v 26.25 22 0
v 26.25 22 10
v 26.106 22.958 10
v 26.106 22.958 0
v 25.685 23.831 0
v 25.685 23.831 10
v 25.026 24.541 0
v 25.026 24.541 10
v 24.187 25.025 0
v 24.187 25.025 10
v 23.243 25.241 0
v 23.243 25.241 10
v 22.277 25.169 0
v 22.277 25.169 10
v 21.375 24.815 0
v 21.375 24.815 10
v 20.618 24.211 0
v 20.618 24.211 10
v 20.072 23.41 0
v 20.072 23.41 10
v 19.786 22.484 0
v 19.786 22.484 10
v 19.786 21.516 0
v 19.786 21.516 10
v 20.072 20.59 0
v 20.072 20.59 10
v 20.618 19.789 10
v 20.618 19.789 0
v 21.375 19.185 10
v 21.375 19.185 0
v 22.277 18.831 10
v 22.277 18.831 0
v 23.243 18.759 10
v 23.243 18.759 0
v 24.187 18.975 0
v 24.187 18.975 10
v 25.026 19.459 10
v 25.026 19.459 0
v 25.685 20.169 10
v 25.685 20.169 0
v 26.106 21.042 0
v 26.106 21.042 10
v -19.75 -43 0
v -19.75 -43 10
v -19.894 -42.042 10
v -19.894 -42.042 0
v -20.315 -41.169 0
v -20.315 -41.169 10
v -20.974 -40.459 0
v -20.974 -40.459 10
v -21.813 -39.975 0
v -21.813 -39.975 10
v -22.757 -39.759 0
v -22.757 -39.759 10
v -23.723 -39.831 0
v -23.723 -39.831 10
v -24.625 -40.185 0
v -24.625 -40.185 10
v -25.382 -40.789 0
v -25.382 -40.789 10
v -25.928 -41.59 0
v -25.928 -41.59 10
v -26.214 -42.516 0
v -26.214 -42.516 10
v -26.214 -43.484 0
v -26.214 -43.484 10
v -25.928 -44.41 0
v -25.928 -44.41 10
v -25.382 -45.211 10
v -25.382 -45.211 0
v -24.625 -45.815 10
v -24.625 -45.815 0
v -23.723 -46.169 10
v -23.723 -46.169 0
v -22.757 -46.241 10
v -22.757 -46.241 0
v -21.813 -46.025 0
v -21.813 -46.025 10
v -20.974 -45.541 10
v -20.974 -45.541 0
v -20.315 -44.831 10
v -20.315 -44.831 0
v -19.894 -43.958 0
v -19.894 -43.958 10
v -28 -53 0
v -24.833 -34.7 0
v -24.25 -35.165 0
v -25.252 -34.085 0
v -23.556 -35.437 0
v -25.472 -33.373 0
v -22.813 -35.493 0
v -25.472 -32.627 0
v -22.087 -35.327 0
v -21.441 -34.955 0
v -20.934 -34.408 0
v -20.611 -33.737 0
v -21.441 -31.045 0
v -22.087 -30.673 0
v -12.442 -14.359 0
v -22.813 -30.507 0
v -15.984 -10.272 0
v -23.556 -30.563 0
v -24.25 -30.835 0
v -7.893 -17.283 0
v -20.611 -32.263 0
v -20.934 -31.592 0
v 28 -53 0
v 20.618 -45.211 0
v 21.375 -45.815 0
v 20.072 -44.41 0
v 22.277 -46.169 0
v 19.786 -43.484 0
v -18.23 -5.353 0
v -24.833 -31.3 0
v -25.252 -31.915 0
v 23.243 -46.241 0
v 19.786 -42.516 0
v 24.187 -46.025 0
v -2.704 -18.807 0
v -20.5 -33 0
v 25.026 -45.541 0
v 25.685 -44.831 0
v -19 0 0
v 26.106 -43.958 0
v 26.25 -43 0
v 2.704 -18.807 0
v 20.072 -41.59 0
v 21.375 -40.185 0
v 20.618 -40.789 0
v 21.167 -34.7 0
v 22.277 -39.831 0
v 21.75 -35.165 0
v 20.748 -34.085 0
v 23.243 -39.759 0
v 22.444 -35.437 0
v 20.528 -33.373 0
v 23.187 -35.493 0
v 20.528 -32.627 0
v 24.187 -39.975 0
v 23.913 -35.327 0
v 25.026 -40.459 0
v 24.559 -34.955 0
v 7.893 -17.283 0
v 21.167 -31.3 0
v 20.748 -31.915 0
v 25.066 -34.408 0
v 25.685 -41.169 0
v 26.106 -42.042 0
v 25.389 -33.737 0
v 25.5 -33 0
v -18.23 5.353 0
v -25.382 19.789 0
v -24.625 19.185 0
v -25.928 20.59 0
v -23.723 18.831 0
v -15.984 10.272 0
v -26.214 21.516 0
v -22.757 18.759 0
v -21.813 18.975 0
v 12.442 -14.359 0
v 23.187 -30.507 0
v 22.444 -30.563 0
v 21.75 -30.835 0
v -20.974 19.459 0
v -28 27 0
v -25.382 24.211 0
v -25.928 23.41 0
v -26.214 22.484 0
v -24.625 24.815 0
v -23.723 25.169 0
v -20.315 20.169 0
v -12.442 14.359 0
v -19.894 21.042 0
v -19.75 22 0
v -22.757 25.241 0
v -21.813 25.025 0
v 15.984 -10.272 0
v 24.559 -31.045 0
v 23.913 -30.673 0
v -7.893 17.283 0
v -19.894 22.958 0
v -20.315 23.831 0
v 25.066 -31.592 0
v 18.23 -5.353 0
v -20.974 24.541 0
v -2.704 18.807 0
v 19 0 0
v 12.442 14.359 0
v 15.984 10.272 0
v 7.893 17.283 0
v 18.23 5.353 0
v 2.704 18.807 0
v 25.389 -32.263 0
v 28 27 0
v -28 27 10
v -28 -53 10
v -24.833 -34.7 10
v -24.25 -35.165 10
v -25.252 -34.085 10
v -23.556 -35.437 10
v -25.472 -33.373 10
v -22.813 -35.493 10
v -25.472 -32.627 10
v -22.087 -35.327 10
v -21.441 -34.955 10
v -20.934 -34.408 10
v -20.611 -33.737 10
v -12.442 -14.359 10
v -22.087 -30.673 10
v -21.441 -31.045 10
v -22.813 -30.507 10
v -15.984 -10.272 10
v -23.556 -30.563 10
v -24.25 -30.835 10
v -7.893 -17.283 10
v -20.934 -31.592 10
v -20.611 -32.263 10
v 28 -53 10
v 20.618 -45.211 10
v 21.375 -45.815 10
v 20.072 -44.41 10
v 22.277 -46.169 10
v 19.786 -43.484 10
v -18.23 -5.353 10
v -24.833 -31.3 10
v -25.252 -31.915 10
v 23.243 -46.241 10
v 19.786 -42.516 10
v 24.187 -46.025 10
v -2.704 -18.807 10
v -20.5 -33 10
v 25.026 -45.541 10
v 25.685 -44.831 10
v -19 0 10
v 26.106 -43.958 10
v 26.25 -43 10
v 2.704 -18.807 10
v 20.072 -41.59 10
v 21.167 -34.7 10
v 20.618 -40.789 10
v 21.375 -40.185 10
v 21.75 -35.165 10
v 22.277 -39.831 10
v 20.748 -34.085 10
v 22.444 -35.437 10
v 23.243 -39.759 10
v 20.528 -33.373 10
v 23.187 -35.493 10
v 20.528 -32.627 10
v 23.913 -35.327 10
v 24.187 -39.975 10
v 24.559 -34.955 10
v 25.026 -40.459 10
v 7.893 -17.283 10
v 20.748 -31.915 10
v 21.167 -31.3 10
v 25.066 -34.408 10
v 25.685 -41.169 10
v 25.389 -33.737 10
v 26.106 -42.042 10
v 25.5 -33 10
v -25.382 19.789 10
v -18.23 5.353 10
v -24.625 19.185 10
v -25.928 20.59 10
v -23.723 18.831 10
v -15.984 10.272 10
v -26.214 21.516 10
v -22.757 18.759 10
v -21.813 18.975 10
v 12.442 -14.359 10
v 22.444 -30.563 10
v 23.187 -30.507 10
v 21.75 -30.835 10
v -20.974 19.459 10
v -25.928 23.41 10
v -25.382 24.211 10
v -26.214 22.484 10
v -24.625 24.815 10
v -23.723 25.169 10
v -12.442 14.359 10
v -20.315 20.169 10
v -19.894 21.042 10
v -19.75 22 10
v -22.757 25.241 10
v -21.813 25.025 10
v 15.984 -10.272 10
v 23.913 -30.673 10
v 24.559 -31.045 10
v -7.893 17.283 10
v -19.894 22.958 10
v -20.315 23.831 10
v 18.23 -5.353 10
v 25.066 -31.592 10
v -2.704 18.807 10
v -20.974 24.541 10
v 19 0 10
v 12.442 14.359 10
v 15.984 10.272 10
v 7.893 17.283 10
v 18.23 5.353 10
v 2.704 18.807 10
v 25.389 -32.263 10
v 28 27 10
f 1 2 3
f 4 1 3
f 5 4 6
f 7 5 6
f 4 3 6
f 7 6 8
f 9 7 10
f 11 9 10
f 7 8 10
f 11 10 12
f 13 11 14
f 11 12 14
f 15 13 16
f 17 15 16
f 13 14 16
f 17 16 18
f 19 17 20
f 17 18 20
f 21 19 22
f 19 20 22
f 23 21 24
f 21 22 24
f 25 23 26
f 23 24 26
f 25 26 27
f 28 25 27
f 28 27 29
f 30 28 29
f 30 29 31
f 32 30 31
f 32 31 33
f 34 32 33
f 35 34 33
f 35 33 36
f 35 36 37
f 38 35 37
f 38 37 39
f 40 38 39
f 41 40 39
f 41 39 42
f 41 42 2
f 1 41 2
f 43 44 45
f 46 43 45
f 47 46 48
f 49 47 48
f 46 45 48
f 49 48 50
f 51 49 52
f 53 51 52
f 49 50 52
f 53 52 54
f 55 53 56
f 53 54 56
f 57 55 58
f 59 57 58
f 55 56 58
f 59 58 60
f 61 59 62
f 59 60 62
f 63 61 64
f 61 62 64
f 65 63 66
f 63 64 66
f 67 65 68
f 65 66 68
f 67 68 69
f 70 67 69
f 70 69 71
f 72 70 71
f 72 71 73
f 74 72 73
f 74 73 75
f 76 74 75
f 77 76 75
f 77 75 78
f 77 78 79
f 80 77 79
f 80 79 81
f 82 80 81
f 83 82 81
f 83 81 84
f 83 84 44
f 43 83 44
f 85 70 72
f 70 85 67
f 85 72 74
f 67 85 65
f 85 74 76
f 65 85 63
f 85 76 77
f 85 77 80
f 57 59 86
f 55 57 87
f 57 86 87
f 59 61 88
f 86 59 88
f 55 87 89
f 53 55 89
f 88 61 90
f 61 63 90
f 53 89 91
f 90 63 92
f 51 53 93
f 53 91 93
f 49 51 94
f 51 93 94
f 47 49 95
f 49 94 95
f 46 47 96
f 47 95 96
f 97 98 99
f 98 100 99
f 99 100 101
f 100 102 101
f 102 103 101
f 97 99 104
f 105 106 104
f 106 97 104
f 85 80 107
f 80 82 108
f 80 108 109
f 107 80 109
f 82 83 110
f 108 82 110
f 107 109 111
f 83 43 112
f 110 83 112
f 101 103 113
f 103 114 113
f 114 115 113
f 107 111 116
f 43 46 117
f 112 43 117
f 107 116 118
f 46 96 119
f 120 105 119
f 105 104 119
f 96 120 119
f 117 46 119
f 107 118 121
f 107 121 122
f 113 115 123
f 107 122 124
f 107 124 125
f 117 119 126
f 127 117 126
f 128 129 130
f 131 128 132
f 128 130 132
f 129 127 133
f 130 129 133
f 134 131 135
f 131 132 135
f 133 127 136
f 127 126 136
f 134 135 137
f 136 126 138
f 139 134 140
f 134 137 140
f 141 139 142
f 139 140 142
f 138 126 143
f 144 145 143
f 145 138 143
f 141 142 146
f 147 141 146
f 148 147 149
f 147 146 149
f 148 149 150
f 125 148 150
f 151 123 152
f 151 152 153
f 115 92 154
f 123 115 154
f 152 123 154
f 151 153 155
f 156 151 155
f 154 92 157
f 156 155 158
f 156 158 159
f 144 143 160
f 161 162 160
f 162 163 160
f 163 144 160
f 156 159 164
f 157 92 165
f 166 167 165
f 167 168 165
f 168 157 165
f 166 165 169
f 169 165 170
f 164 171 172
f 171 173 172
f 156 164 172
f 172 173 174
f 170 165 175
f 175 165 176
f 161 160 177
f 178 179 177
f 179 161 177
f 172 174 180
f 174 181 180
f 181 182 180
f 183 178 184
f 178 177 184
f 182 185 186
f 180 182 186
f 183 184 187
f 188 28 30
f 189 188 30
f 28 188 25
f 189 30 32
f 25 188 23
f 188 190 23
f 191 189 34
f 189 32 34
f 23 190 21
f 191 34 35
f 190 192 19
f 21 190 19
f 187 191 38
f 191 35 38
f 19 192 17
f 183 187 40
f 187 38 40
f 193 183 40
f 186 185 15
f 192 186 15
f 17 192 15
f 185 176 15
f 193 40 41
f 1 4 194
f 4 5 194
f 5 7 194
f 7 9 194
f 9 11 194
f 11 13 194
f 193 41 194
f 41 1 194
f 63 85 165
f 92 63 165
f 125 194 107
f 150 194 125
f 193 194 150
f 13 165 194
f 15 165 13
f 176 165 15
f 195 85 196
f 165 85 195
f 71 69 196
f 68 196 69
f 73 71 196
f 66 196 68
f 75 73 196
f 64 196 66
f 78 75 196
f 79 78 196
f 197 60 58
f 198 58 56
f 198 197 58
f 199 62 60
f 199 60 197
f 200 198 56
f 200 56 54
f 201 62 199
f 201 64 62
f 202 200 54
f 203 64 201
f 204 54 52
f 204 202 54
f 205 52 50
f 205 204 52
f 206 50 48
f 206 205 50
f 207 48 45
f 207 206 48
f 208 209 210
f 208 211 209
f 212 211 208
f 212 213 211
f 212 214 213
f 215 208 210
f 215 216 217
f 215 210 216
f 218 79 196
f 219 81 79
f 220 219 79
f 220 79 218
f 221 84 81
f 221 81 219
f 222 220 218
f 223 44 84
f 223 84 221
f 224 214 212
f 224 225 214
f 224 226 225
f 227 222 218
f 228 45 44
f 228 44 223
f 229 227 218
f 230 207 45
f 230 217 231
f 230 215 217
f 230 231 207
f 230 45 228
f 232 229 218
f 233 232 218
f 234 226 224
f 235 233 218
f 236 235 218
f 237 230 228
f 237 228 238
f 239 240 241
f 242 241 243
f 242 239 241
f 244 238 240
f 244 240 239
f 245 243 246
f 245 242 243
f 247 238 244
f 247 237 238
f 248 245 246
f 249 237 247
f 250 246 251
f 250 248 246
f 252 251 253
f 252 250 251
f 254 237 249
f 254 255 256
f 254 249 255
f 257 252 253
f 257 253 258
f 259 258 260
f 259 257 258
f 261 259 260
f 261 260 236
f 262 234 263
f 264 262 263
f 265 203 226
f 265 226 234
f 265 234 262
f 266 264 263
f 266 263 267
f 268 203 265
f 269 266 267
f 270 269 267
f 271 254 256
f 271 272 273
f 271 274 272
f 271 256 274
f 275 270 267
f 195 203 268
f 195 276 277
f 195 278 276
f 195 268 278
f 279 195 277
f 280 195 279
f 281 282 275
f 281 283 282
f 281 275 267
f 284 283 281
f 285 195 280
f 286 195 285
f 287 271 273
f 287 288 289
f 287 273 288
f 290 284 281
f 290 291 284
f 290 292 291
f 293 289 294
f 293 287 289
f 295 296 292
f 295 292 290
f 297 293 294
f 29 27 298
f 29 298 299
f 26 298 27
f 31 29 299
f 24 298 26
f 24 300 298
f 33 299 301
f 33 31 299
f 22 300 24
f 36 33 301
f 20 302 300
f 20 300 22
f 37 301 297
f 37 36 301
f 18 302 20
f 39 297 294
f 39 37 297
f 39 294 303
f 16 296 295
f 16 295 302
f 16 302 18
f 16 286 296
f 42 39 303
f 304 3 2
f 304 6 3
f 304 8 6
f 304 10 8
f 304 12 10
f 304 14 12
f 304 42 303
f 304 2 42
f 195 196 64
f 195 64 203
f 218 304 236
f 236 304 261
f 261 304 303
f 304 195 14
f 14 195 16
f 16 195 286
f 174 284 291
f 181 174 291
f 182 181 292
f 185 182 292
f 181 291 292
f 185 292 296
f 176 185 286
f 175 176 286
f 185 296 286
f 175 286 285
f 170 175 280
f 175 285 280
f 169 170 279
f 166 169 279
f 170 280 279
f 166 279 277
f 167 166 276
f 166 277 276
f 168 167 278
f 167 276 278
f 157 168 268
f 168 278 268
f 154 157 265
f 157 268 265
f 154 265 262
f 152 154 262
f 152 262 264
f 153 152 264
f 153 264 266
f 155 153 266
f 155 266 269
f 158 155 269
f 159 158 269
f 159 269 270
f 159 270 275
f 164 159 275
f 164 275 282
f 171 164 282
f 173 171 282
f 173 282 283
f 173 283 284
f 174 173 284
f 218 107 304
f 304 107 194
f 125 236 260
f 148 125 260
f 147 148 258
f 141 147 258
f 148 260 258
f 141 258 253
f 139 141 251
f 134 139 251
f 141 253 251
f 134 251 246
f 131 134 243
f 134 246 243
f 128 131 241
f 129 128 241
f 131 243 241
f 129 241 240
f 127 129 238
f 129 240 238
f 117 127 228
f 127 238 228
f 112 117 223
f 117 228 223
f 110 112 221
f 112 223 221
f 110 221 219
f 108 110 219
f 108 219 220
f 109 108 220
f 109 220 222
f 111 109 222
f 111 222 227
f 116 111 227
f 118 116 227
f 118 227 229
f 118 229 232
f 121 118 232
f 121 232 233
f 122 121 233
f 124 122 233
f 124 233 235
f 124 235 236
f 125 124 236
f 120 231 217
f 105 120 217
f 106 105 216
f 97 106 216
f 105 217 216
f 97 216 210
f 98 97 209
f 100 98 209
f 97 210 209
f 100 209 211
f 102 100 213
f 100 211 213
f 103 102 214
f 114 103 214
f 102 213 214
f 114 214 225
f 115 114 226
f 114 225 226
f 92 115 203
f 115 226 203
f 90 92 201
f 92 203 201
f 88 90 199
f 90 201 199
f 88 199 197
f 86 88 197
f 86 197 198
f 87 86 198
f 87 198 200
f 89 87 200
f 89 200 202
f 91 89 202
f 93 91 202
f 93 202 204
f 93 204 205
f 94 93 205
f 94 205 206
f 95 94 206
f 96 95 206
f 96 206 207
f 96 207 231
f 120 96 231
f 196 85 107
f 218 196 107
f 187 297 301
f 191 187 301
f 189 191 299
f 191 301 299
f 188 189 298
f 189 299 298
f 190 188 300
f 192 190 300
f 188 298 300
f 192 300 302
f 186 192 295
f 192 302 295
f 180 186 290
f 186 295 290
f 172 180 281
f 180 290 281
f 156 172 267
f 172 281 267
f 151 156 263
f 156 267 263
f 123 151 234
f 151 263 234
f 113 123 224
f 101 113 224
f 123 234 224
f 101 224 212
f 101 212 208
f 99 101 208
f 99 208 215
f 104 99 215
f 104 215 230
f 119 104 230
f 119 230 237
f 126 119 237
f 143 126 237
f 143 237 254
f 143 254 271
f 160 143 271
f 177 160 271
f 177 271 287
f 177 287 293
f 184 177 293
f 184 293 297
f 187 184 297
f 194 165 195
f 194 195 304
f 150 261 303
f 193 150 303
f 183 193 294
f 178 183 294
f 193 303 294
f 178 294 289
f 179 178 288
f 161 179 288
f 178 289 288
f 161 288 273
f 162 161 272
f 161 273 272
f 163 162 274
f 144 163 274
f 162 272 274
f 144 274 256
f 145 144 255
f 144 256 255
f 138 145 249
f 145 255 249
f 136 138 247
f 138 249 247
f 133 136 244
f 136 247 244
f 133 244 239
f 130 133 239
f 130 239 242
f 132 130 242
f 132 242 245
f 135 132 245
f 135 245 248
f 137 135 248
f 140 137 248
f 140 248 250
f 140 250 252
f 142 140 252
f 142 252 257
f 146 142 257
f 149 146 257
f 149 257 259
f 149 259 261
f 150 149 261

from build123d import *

# Parameters (mm, degrees)
F0_W     = 56
F0_H     = 80
F1_DEPTH = 10
F2_R     = 19
F3_DEPTH = 10.001
F4_R     = 3.25
F5_DEPTH = 10.001
F6_R     = 2.5
F7_DEPTH = 10.001


with BuildPart() as f1:
    # F0 (on Top) → F1 (new body)
    with BuildSketch(Plane.XY):
        with Locations((0, -13)):
            Rectangle(F0_W, F0_H)
    extrude(amount=F1_DEPTH)

    # F2 (on face) → F3 (cut, through all)
    with BuildSketch(Plane.XY.offset(10)):
        Circle(F2_R)
    extrude(amount=-F3_DEPTH, mode=Mode.SUBTRACT)

    # F4 (on face) → F5 (cut, through all)
    with BuildSketch(Plane.XY.offset(10)):
        with Locations((-23, 22)):
            Circle(F4_R)
        with Locations((-23, -43)):
            Circle(F4_R)
        with Locations((23, 22)):
            Circle(F4_R)
        with Locations((23, -43)):
            Circle(F4_R)
    extrude(amount=-F5_DEPTH, mode=Mode.SUBTRACT)

    # F6 (on face) → F7 (cut, through all)
    with BuildSketch(Plane.XY.offset(10)):
        with Locations((-23, -33)):
            Circle(F6_R)
        with Locations((23, -33)):
            Circle(F6_R)
    extrude(amount=-F7_DEPTH, mode=Mode.SUBTRACT)


solid = f1.part
